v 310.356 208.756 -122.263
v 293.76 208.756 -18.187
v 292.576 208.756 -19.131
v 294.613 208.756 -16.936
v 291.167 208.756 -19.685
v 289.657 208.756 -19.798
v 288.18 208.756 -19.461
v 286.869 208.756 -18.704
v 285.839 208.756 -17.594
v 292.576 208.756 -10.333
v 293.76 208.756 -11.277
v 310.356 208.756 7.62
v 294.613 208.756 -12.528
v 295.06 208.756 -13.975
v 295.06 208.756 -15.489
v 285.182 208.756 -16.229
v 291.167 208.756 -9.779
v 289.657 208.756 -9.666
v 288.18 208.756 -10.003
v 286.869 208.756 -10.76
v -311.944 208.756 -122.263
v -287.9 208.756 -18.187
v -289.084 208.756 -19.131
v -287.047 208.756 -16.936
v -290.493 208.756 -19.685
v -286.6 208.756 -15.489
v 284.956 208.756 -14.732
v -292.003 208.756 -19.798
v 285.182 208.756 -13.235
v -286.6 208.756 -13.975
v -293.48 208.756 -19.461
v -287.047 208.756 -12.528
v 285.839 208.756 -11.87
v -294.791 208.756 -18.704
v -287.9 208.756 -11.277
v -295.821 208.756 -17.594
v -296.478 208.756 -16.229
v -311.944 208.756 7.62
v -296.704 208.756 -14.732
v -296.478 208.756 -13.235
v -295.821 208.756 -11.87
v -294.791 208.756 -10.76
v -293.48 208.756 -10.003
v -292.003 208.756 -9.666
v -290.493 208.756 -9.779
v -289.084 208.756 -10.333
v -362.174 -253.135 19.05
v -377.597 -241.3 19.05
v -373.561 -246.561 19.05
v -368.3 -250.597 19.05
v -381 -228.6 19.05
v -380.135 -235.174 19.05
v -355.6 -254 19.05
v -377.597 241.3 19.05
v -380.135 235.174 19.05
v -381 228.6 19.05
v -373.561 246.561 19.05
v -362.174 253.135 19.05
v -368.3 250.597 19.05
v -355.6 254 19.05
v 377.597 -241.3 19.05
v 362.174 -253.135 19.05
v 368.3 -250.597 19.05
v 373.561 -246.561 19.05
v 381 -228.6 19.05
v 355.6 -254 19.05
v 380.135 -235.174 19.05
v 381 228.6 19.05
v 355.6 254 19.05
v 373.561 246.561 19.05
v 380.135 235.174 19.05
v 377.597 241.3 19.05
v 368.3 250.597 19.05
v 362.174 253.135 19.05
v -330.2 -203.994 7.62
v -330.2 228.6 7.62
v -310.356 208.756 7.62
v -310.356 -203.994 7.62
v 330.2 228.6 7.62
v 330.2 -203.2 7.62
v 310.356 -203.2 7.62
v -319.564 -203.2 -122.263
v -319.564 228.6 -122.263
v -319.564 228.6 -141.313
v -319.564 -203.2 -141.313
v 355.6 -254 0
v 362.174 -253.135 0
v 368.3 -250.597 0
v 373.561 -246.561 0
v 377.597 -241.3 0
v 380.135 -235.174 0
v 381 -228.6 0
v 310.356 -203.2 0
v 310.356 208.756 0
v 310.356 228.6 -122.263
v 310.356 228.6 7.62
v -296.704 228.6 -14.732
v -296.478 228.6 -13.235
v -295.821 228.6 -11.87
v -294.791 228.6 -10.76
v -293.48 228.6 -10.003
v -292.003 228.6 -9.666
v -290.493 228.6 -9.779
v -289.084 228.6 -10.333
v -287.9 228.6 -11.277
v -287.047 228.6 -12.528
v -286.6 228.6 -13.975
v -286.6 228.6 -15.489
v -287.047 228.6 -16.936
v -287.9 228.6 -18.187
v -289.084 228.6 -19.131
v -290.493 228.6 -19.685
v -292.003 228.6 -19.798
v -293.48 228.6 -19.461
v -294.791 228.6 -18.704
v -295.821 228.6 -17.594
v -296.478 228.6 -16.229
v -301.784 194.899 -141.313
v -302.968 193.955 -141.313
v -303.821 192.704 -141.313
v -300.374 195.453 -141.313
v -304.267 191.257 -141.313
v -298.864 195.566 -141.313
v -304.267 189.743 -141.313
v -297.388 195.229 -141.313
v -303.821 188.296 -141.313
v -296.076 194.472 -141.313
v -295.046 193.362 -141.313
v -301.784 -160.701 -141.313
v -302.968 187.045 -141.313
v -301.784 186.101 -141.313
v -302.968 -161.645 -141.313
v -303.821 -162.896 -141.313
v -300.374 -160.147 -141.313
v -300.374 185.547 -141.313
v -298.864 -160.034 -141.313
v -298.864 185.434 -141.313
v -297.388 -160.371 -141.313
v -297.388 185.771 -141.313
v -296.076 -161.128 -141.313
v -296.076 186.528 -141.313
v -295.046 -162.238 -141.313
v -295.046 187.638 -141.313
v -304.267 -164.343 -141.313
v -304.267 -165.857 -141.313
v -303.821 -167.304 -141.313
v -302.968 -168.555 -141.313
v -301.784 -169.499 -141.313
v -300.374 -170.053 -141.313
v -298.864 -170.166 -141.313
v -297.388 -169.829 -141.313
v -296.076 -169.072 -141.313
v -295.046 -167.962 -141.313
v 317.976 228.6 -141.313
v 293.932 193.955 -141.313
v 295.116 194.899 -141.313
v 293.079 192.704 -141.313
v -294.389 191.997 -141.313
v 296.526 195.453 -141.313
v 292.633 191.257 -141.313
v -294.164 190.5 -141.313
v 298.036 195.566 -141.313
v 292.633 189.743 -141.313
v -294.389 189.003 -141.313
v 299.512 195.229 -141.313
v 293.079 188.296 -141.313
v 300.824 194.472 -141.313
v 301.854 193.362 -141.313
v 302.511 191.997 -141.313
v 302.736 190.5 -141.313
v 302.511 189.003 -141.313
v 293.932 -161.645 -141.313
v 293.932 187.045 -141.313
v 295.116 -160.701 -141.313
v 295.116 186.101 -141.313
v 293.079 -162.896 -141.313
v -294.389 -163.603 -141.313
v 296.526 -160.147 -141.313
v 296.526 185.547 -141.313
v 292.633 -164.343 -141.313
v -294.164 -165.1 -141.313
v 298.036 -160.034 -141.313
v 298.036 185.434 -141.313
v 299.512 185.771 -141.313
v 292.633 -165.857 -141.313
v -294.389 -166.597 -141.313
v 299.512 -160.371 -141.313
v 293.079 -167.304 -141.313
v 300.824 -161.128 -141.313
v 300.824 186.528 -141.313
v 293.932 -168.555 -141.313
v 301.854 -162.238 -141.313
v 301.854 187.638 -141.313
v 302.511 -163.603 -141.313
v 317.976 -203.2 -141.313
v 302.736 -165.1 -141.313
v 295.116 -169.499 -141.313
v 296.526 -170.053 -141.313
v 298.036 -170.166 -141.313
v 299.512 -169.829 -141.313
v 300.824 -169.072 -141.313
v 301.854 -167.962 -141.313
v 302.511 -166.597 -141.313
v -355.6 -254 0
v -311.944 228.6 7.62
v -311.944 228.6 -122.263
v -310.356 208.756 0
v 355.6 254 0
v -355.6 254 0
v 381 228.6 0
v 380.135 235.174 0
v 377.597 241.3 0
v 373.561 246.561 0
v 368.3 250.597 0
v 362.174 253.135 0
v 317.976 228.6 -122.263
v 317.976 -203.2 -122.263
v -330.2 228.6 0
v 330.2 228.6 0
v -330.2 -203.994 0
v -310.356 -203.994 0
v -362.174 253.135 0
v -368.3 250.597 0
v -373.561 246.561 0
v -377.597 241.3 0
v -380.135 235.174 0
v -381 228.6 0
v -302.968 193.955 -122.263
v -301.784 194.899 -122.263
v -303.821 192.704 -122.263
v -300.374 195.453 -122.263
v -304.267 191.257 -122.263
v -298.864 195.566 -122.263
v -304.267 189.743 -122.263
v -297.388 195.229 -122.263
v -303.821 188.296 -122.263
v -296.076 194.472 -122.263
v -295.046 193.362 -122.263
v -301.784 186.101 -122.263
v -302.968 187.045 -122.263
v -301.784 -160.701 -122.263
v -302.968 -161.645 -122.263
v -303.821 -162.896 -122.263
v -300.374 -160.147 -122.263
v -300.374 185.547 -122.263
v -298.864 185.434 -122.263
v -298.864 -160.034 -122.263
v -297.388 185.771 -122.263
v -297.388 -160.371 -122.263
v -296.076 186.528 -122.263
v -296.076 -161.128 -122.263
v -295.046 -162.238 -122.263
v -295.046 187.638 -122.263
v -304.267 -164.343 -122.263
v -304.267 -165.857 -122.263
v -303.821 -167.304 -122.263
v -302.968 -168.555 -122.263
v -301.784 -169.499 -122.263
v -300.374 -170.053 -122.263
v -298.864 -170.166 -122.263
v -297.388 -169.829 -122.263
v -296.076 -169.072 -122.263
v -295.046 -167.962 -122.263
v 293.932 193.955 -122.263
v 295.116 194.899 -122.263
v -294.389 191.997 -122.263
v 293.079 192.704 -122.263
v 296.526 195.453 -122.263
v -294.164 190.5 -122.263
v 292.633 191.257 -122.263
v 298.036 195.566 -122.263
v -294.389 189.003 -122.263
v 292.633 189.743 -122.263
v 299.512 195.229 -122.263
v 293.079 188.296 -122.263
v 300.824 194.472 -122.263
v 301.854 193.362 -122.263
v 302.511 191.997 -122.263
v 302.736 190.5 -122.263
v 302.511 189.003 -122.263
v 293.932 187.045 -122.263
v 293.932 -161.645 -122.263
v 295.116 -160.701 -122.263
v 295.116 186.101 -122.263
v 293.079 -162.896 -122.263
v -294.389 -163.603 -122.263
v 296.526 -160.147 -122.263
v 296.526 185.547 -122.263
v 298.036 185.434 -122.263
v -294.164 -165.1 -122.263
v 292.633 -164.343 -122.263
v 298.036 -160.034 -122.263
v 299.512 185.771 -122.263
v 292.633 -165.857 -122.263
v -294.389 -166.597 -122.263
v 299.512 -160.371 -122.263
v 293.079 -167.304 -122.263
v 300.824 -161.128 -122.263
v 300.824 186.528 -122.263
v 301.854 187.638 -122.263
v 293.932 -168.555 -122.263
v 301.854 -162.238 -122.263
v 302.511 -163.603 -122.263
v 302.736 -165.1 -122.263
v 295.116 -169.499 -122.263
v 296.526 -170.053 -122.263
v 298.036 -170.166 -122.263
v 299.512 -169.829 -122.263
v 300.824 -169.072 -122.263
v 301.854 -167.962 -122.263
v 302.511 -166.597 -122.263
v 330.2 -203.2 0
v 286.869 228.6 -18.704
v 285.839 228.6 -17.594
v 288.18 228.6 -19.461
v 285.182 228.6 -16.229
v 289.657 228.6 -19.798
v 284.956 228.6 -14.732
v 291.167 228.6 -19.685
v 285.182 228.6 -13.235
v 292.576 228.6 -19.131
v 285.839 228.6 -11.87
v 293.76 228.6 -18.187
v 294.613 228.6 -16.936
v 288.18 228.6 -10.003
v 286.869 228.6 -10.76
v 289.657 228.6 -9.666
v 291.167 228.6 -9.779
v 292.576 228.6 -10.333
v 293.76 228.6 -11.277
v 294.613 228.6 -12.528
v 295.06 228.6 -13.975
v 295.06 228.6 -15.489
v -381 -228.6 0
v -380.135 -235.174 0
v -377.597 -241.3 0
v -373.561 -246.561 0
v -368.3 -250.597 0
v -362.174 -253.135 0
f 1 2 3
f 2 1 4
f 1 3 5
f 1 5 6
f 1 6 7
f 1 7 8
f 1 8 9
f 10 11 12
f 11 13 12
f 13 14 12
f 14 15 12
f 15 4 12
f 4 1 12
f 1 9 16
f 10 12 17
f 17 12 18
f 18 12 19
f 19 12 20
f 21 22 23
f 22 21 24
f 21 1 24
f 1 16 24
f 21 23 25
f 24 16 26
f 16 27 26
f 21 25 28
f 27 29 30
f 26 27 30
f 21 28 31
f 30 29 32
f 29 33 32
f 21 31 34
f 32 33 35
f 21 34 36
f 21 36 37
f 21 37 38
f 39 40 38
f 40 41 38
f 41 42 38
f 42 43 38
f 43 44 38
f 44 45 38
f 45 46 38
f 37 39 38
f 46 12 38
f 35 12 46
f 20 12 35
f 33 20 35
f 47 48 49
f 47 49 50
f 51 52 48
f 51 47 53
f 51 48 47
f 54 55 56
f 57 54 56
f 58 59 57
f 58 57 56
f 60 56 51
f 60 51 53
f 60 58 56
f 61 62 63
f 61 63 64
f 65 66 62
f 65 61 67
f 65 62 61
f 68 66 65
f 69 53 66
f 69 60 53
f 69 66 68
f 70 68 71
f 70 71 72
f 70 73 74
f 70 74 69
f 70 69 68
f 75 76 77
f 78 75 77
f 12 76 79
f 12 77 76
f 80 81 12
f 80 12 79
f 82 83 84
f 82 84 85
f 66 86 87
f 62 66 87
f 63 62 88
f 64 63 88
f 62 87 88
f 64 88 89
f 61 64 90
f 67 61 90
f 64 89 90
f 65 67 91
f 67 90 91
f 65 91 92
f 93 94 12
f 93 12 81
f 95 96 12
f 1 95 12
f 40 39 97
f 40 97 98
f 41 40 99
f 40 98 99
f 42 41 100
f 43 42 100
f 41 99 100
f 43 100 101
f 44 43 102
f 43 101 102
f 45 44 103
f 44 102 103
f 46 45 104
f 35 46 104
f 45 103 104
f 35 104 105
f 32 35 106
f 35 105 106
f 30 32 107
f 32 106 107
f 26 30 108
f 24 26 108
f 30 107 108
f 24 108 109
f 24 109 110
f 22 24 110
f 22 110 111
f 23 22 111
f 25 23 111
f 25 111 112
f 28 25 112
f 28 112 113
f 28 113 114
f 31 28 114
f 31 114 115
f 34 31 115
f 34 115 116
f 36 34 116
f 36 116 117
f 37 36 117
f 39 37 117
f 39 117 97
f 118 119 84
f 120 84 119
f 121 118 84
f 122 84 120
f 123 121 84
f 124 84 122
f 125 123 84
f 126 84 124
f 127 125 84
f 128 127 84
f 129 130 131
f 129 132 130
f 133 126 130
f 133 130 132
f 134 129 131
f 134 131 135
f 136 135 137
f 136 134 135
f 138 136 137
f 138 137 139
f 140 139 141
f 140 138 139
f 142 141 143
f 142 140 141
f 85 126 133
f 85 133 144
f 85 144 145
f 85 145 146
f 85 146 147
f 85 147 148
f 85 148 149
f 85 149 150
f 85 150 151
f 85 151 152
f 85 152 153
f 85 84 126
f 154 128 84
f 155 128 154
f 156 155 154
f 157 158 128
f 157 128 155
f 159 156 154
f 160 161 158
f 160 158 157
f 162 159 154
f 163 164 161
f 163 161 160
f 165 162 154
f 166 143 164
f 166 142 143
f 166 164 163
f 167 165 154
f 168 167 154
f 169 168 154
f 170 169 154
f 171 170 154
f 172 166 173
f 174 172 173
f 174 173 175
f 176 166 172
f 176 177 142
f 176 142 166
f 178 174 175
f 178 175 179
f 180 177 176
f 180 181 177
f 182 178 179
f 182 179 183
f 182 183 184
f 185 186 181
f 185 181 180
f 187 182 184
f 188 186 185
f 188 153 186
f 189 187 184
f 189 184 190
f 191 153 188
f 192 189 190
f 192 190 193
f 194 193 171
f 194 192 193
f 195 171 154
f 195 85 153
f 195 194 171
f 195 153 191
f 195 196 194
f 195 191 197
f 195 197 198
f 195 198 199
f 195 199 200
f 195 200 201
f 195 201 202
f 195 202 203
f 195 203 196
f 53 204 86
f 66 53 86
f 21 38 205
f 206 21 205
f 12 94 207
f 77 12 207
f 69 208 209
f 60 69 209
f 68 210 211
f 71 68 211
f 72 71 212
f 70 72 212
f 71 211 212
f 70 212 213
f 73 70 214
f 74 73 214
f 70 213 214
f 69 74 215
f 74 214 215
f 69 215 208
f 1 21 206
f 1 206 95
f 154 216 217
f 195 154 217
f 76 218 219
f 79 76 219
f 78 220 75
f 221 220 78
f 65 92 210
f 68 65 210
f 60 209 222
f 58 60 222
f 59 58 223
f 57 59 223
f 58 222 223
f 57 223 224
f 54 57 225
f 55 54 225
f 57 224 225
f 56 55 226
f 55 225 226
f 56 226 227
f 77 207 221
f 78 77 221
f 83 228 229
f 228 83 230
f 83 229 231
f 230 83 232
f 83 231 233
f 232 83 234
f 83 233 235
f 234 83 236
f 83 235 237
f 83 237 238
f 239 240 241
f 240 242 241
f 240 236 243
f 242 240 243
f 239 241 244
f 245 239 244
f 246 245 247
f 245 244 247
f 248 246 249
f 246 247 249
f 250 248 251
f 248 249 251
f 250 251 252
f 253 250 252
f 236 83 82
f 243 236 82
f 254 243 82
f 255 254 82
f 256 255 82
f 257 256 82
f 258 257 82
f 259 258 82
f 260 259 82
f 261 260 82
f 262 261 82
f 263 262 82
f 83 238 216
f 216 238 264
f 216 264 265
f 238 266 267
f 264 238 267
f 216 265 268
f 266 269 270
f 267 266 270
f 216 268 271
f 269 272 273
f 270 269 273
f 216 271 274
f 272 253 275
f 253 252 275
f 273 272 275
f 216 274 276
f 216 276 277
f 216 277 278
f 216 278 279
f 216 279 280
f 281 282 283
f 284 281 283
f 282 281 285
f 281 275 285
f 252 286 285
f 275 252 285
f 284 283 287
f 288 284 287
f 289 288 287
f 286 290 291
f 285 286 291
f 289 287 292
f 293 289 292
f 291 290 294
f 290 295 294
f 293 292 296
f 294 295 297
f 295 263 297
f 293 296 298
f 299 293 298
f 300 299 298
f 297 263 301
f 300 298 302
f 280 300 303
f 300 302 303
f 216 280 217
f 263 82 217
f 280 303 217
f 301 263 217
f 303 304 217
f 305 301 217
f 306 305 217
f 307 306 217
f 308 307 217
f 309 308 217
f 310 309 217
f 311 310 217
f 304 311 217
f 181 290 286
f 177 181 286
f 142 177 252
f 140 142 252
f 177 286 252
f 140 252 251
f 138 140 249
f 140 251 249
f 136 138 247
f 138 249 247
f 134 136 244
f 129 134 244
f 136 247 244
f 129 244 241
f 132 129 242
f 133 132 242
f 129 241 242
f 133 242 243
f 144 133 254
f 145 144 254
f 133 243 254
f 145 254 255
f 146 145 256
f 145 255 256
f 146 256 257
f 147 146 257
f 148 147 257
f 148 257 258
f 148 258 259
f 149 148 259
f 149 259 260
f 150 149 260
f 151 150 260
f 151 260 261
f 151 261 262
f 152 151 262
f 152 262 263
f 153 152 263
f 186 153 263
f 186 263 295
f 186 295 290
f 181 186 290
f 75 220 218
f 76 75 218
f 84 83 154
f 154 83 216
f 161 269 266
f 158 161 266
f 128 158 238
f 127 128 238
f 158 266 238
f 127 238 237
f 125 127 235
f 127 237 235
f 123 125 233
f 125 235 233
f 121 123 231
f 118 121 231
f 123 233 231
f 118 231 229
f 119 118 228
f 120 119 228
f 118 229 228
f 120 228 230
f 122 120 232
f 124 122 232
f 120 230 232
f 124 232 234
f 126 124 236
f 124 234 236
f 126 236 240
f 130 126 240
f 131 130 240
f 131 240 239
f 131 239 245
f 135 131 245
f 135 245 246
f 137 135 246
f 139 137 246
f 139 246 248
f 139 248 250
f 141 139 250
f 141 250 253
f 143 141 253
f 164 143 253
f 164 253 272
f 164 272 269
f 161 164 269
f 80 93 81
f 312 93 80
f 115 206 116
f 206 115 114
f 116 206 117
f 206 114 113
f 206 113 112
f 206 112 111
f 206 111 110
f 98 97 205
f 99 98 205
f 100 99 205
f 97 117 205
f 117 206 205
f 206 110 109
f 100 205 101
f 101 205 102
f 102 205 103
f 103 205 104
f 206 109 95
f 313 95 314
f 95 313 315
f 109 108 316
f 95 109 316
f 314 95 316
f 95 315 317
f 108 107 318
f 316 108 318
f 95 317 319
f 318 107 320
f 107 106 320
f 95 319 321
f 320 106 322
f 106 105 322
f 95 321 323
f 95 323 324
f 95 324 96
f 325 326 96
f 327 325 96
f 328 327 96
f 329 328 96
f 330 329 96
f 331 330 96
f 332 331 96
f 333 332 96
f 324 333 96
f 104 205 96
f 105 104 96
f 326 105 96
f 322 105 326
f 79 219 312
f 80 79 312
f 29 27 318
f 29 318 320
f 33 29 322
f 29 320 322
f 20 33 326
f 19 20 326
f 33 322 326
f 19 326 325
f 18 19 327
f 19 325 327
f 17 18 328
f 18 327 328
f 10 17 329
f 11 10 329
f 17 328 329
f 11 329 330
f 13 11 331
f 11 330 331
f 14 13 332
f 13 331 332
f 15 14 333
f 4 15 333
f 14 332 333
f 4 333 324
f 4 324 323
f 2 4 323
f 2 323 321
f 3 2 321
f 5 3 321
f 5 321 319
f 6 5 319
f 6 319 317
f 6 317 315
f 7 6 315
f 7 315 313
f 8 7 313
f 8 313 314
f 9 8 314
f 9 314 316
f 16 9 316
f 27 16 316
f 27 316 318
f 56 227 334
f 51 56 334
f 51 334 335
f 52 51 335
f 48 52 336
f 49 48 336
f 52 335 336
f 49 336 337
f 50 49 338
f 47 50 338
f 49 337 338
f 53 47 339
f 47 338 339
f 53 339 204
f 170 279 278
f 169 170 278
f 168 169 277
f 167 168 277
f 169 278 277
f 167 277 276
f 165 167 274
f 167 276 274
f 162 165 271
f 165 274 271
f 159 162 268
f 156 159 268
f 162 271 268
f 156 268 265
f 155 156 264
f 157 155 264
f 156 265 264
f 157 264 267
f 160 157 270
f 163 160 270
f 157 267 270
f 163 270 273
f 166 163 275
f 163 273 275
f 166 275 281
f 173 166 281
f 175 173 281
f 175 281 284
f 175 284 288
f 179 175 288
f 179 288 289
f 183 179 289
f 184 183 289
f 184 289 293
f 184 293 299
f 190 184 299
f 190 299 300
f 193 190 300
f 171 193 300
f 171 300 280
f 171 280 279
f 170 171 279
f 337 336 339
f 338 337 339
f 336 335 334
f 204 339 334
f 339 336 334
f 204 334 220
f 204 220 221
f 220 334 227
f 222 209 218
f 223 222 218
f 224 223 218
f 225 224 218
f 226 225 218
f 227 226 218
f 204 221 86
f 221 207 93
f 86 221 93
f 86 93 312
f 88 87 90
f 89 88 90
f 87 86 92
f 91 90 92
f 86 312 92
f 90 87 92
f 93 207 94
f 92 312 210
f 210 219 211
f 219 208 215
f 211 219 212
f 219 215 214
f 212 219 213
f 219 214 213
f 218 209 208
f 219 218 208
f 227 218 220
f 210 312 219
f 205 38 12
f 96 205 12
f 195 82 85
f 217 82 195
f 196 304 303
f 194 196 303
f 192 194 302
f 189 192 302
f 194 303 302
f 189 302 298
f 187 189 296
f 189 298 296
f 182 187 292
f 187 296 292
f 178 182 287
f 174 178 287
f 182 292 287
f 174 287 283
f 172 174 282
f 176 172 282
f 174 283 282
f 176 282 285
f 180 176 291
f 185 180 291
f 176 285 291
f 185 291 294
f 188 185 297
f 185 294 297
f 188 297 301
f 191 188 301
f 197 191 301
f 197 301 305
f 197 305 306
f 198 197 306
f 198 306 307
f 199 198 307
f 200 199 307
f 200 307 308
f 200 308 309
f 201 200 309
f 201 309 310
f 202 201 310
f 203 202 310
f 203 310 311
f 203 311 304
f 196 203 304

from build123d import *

# Parameters (mm, degrees)
F1_DEPTH  = 19.05
F2_W      = 19.84375
F2_H      = 411.95625
F2_H_2    = 412.75
F3_DEPTH  = 7.62
F5_DEPTH  = 129.8829
F6_W      = 637.54
F6_H      = 431.8
F7_DEPTH  = 19.05
F8_R      = 5.08
F9_DEPTH  = 25.4
F10_R     = 5.08
F11_DEPTH = 25.4


with BuildPart() as f1:
    # F0 (on Top) → F1 (new body)
    with BuildSketch(Plane.XY):
        with BuildLine():
            Line((355.6, 254), (-355.6, 254))
            ThreePointArc((-355.6, 254), (-373.560512, 246.560512), (-381, 228.6))
            Line((-381, 228.6), (-381, -228.6))
            ThreePointArc((-381, -228.6), (-373.560512, -246.560512), (-355.6, -254))
            Line((-355.6, -254), (355.6, -254))
            ThreePointArc((355.6, -254), (373.560512, -246.560512), (381, -228.6))
            Line((381, -228.6), (381, 228.6))
            ThreePointArc((381, 228.6), (373.560512, 246.560512), (355.6, 254))
        make_face()
    extrude(amount=F1_DEPTH)

    # F2 (on face) → F3 (cut)
    with BuildSketch(Plane(origin=(0, 0, 0), x_dir=(1, 0, 0), z_dir=(0, 0, -1))):
        Polygon((-330.2, -228.6), (330.2, -228.6), (330.2, -208.75625), (310.35625, -208.75625), (-310.35625, -208.75625), (-330.2, -208.75625), align=None)
        with Locations((320.278125, -2.778125)):
            Rectangle(F2_W, F2_H)
        with Locations((-320.278125, -2.38125)):
            Rectangle(F2_W, F2_H_2)
    extrude(amount=-F3_DEPTH, mode=Mode.SUBTRACT)


with BuildPart() as f5:
    # F4 (on face) → F5 (new body)
    with BuildSketch(Plane(origin=(0, 0, 7.62), x_dir=(1, 0, 0), z_dir=(0, 0, -1))):
        Polygon((310.35625, -228.6), (310.35625, -208.75625), (-310.35625, -208.75625), (-311.94375, -208.75625), (-311.94375, -228.6), align=None)
    extrude(amount=F5_DEPTH)

    # F8 (on face) → F9 (cut)
    with BuildSketch(Plane(origin=(0, 228.6, 0), x_dir=(-1, 0, 0), z_dir=(0, 1, 0))):
        with Locations((-290.03625, -14.732)):
            Circle(F8_R)
        with Locations((291.62375, -14.732)):
            Circle(F8_R)
    extrude(amount=-F9_DEPTH, mode=Mode.SUBTRACT)


with BuildPart() as f7:
    # F6 (on face) → F7 (new body)
    with BuildSketch(Plane(origin=(0, 0, -122.2629), x_dir=(1, 0, 0), z_dir=(0, 0, -1))):
        with Locations((-0.79375, -12.7)):
            Rectangle(F6_W, F6_H)
    extrude(amount=F7_DEPTH)

    # F10 (on face) → F11 (cut)
    with BuildSketch(Plane.XY.offset(-122.2629)):
        with Locations((-299.24375, 190.5)):
            Circle(F10_R)
        with Locations((297.65625, 190.5)):
            Circle(F10_R)
        with Locations((297.65625, -165.1)):
            Circle(F10_R)
        with Locations((-299.24375, -165.1)):
            Circle(F10_R)
    extrude(amount=-F11_DEPTH, mode=Mode.SUBTRACT)


solid = Compound([f1.part, f5.part, f7.part])
